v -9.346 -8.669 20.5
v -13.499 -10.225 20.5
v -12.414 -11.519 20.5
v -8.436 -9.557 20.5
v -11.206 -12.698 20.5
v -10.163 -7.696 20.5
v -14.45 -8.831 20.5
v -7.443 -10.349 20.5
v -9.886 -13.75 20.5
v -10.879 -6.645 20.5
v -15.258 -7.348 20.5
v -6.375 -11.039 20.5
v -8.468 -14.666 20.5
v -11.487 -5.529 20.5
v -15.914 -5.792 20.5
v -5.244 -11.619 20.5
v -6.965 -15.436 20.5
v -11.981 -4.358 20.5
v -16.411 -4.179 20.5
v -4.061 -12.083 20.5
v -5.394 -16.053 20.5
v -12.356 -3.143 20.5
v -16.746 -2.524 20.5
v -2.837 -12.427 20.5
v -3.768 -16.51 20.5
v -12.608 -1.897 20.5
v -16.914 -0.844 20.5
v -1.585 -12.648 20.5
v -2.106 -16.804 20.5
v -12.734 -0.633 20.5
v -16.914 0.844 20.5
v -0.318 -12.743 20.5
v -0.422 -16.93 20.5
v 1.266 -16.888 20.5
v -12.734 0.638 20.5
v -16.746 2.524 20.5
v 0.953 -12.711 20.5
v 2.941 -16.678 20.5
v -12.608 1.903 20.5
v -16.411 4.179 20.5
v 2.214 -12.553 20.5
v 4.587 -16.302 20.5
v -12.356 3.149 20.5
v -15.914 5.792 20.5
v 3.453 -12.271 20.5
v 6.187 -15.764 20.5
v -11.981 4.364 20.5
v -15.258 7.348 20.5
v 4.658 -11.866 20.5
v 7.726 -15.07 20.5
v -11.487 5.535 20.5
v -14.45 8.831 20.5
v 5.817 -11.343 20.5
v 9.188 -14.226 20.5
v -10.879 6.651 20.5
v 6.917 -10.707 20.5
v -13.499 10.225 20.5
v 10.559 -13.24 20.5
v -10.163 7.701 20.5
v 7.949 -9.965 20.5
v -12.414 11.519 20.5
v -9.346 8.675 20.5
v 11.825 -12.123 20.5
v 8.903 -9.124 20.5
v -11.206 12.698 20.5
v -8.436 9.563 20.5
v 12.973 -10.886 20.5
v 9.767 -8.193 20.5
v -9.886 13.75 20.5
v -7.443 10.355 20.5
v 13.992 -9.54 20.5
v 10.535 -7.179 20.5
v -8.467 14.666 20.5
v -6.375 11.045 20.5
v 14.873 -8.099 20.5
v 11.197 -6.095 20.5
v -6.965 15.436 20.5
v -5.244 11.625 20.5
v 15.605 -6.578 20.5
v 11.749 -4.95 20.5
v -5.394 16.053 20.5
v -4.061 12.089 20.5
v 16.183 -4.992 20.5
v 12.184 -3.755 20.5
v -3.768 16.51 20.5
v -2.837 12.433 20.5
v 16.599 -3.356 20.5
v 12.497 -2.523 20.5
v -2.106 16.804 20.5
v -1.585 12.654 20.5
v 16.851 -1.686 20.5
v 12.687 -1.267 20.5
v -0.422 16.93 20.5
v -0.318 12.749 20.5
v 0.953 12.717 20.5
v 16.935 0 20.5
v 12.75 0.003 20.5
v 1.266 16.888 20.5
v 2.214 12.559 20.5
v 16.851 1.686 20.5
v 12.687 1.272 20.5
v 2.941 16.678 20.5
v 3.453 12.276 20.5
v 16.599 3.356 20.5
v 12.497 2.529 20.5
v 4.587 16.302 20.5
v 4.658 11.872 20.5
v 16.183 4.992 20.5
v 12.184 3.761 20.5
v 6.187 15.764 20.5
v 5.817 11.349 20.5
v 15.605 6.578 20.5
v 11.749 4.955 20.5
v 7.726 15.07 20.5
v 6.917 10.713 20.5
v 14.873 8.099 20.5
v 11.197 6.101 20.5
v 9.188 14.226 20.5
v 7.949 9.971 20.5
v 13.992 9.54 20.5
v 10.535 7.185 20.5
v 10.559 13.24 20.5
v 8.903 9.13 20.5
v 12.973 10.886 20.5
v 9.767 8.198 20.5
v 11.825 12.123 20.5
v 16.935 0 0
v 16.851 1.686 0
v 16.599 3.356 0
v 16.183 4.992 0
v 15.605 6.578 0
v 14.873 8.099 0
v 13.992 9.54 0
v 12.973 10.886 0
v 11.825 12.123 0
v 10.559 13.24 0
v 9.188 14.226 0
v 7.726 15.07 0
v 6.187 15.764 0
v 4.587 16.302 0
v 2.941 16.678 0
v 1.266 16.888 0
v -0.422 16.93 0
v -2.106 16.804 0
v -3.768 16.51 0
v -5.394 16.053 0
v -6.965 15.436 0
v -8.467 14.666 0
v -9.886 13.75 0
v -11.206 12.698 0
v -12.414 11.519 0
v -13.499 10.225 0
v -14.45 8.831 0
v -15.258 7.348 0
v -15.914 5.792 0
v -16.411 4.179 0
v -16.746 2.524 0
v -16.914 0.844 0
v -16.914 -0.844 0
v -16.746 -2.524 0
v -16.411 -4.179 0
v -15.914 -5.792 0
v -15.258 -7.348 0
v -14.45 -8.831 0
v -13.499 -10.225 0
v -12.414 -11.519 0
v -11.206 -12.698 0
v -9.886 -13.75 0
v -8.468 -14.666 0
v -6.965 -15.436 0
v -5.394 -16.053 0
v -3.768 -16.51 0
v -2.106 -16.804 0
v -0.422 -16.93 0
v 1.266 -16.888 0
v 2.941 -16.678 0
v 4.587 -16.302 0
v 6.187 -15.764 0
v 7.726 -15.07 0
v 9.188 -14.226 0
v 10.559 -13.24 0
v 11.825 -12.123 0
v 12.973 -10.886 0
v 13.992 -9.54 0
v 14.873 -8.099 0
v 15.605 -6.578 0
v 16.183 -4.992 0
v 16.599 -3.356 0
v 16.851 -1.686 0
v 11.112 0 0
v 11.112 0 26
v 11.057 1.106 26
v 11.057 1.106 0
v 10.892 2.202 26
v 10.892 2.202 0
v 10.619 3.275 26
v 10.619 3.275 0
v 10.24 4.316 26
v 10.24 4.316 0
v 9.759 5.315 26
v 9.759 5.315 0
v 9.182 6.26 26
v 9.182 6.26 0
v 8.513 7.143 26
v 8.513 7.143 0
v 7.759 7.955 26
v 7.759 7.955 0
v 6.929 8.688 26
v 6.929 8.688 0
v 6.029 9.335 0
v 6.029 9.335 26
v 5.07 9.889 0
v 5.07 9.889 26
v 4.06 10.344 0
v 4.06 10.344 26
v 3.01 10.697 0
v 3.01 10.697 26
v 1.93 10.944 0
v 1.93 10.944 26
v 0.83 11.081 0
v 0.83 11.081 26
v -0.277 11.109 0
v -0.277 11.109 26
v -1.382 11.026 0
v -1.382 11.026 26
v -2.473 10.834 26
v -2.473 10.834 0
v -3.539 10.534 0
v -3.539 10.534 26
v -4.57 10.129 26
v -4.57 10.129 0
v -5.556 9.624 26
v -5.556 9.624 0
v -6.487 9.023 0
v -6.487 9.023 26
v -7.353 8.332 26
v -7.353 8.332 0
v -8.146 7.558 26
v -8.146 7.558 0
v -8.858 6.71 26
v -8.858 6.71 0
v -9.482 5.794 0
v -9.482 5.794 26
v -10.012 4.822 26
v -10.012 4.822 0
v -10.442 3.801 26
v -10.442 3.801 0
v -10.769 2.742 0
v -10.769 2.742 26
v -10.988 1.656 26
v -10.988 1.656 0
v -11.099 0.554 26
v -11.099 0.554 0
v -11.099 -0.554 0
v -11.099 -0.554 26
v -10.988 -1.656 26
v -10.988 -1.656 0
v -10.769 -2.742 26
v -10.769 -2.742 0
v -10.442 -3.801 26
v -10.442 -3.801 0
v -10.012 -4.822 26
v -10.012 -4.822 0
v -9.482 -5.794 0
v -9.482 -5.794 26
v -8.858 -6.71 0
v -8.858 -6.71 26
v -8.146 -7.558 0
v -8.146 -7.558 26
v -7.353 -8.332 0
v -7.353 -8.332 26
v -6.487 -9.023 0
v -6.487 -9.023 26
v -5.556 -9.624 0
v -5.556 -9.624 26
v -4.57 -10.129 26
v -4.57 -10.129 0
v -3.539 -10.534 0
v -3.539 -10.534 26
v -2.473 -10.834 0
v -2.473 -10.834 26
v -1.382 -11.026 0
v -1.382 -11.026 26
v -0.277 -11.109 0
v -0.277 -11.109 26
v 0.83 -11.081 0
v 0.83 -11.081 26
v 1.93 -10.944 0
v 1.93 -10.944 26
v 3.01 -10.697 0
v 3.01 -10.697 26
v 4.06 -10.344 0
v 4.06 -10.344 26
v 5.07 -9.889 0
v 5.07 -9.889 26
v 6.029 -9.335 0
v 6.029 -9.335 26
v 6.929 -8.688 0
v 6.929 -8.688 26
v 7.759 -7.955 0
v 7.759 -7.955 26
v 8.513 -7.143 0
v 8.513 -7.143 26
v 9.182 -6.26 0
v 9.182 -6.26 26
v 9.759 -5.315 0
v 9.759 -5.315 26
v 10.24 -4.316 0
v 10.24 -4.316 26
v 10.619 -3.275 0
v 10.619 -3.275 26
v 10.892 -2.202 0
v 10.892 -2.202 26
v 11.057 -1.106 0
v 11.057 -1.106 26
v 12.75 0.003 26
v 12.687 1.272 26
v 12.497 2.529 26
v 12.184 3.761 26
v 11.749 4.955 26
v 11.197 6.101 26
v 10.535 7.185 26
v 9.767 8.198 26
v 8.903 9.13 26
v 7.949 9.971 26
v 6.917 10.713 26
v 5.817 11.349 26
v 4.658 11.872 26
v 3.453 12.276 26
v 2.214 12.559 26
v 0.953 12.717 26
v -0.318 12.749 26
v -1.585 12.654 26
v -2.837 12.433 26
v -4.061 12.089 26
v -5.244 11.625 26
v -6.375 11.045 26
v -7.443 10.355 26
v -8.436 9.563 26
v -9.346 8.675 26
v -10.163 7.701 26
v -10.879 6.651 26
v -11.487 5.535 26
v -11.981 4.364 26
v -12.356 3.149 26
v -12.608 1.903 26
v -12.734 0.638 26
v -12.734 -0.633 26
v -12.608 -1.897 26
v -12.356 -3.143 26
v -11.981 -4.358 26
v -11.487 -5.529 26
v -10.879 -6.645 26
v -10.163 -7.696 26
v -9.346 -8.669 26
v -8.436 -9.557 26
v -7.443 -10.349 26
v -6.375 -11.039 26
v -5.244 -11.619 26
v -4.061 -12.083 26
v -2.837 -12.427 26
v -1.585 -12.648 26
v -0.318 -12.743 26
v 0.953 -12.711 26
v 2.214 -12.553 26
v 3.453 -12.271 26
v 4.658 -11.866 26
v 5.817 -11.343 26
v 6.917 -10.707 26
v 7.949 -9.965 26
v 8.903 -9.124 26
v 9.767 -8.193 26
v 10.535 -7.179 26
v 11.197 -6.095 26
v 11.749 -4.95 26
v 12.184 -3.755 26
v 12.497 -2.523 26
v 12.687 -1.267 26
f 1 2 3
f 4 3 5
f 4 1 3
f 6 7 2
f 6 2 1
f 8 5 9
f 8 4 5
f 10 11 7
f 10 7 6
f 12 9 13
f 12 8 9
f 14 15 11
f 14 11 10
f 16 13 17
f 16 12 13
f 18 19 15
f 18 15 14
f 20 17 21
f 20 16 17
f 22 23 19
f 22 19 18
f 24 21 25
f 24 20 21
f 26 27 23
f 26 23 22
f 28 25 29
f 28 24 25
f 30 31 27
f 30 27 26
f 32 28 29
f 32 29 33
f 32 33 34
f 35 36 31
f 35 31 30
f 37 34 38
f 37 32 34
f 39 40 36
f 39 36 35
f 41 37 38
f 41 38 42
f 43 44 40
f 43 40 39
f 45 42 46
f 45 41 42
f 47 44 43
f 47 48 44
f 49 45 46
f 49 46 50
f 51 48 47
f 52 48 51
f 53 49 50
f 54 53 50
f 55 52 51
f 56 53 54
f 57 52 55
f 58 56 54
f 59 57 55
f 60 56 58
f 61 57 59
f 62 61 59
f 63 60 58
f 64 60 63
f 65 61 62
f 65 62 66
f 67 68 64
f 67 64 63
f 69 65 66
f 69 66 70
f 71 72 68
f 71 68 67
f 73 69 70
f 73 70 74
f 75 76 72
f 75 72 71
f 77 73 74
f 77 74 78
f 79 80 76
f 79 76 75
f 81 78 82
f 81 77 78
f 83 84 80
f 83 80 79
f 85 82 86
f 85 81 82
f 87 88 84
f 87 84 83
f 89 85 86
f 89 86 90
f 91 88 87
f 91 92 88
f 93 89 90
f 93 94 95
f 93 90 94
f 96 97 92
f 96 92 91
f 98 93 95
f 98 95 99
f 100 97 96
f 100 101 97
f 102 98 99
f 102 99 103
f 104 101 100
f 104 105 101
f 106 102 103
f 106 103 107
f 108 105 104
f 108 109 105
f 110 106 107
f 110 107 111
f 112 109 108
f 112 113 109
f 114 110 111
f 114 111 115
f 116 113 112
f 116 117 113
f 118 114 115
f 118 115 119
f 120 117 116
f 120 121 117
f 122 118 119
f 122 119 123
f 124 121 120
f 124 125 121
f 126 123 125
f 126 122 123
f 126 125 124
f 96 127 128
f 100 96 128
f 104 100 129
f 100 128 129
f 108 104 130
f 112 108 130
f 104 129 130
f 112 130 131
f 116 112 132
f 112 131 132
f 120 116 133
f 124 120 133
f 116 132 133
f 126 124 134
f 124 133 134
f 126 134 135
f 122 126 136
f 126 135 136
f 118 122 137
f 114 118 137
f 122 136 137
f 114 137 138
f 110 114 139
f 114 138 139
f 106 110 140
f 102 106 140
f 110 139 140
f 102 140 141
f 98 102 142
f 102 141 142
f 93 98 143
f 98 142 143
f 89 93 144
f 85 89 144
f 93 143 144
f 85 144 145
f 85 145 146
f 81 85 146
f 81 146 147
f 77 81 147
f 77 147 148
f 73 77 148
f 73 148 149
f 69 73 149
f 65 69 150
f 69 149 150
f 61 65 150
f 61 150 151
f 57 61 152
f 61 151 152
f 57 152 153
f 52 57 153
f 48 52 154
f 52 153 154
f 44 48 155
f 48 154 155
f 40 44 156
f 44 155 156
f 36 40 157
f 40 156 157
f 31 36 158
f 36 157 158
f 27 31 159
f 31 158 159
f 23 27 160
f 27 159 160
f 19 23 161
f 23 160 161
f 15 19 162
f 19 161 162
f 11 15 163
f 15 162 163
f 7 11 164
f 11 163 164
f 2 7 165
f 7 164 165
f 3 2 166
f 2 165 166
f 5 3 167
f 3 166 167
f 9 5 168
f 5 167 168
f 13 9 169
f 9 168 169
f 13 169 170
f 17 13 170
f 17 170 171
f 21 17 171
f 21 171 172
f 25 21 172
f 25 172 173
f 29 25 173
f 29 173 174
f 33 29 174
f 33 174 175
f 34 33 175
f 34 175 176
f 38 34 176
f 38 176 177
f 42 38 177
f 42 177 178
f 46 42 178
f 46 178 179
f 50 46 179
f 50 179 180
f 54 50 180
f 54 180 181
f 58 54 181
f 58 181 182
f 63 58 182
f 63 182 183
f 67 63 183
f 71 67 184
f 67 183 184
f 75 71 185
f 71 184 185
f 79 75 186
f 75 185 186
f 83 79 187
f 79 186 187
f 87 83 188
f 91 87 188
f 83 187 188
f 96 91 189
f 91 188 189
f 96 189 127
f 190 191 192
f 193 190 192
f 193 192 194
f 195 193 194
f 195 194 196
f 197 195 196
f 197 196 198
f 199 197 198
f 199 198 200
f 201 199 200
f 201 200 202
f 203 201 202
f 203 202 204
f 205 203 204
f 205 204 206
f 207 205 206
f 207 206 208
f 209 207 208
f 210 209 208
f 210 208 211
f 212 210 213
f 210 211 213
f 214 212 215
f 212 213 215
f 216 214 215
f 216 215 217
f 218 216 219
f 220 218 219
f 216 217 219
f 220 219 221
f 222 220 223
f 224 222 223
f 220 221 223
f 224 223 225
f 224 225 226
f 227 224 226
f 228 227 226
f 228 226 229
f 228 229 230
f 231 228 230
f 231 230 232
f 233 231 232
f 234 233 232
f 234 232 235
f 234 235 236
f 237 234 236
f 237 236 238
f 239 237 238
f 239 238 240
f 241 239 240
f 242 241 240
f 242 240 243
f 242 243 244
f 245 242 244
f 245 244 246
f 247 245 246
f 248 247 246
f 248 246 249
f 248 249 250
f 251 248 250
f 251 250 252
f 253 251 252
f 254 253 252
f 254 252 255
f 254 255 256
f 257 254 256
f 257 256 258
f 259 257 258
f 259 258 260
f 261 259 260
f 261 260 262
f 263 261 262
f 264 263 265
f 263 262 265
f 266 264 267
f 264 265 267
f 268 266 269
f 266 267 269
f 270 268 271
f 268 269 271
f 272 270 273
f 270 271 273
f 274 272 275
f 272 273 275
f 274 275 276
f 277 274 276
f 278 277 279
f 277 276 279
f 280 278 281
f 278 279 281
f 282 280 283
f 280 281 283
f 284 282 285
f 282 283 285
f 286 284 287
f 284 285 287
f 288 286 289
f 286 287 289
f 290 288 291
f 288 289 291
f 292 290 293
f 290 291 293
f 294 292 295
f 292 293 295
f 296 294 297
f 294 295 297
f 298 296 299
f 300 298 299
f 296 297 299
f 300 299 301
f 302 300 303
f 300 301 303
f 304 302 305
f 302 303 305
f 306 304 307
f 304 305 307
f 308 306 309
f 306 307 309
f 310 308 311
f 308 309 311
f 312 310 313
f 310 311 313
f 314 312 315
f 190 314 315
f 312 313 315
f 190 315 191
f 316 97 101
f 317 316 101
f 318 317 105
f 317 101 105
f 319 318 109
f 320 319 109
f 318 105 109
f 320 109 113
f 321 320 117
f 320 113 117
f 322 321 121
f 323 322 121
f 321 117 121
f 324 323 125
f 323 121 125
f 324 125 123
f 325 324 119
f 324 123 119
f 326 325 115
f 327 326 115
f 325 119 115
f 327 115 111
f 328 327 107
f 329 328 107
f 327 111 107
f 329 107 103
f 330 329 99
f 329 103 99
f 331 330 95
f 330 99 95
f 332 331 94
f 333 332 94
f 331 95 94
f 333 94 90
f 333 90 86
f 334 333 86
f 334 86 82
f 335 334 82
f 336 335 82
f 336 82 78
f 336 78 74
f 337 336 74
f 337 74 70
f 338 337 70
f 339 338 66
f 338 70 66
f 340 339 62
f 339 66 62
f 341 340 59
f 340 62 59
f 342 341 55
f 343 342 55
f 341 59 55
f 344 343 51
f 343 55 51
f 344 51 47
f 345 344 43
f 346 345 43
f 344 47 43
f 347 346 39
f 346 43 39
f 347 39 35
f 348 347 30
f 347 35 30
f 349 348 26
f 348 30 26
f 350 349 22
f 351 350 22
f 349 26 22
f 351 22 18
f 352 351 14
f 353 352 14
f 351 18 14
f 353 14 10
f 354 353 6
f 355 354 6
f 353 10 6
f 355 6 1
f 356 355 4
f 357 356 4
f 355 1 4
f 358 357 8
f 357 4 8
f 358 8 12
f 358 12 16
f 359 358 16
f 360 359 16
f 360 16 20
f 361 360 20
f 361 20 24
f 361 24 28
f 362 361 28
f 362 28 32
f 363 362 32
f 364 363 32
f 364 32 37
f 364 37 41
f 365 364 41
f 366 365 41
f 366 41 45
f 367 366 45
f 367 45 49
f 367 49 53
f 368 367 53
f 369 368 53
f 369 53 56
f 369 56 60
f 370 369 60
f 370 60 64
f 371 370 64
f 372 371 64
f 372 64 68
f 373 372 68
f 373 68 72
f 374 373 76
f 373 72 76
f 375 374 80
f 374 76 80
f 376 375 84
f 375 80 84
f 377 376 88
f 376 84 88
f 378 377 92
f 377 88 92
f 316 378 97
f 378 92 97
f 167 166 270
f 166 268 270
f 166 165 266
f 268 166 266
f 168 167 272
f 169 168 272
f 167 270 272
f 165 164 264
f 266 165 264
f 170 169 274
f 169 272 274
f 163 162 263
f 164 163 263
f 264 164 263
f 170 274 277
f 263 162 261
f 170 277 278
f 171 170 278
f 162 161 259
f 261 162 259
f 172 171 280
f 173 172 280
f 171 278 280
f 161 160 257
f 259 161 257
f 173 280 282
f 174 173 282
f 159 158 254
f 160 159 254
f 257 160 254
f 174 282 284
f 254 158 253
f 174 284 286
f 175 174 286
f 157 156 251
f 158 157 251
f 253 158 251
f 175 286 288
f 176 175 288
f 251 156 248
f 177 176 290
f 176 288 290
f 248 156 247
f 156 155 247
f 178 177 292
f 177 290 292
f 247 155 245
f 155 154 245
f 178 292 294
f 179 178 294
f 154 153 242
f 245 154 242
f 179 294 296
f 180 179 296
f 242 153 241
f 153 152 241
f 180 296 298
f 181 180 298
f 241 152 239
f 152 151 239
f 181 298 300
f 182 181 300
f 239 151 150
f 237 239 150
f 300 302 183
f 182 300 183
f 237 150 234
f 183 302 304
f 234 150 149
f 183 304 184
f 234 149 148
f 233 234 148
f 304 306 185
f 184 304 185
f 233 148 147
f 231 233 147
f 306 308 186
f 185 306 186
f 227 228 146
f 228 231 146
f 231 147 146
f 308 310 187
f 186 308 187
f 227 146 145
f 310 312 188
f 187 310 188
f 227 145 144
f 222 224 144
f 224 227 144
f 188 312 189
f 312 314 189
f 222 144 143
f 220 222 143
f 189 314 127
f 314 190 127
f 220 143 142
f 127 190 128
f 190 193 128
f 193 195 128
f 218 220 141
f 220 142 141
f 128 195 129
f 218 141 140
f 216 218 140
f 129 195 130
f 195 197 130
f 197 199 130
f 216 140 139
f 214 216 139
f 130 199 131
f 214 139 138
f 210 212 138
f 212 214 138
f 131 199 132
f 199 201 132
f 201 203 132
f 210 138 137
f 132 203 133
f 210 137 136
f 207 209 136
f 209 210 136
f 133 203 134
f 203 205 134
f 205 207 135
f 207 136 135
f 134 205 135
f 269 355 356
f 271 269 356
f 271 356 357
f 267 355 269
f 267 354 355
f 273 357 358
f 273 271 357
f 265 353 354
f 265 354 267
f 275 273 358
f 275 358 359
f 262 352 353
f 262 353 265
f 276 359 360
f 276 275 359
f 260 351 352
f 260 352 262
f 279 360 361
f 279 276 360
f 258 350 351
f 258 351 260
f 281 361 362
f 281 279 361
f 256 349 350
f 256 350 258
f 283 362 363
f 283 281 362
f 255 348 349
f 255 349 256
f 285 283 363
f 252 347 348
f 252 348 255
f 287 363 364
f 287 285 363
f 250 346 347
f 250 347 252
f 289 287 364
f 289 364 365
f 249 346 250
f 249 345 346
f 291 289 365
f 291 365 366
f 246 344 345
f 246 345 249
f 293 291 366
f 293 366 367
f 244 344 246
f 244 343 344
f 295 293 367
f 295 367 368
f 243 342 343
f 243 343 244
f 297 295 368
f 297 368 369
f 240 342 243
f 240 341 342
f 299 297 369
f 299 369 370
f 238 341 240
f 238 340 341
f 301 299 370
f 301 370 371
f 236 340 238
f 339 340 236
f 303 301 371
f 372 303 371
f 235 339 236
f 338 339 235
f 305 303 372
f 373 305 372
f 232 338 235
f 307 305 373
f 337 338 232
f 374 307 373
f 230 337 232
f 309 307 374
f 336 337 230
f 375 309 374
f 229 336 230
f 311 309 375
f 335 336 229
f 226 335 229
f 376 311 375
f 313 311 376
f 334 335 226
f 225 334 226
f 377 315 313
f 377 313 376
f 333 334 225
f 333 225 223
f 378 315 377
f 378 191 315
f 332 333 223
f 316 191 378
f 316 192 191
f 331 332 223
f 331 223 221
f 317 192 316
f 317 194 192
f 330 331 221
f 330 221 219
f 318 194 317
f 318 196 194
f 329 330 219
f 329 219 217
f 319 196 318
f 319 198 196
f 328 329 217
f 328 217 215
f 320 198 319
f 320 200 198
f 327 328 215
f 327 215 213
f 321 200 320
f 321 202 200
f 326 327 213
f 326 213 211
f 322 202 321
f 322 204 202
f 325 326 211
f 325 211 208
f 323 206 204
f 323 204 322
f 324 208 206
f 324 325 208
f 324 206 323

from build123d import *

# Parameters (mm, degrees)
F0_R     = 16.935
F1_DEPTH = 20.5
F2_R     = 12.75
F3_DEPTH = 5.5
F4_R     = 11.1125
F5_DEPTH = 40.132


with BuildPart() as f1:
    # F0 (on Top) → F1 (new body)
    with BuildSketch(Plane.XY):
        Circle(F0_R)
    extrude(amount=F1_DEPTH)

    # F2 (on face) → F3 (join)
    with BuildSketch(Plane.XY.offset(20.5)):
        with Locations((0, 0.00292)):
            Circle(F2_R)
    extrude(amount=F3_DEPTH)

    # F4 (on face) → F5 (cut)
    with BuildSketch(Plane.XY.offset(26)):
        Circle(F4_R)
    extrude(amount=-F5_DEPTH, mode=Mode.SUBTRACT)


solid = f1.part
